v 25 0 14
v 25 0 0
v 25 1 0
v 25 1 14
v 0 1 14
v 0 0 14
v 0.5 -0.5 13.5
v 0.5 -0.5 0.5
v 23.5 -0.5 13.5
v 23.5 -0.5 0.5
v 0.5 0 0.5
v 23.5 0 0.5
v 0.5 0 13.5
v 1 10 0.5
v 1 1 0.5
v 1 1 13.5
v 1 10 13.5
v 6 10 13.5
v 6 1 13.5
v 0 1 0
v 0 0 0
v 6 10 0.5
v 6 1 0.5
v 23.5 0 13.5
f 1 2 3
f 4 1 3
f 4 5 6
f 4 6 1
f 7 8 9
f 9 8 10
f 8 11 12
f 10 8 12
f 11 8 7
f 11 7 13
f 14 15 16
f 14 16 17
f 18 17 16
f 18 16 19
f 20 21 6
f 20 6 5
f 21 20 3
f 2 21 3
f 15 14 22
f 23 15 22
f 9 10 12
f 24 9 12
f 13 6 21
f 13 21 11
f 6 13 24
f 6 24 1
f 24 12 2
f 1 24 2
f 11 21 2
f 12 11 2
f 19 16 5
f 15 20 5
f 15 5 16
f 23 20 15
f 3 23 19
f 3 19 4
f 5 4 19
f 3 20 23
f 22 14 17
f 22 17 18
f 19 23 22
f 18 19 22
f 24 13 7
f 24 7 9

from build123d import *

# Parameters (mm, degrees)
BOX002_W     = 5
BOX002_H     = 10
BOX002_DEPTH = 13
BOX001_W     = 23
BOX001_H     = 1
BOX001_DEPTH = 13
BOX_W        = 25
BOX_H        = 1
BOX_DEPTH    = 14


with BuildPart() as cubo002:
    # Box002 → Box002 (new body)
    with BuildSketch(Plane(origin=(1, 0, 0.5), x_dir=(1, 0, 0), z_dir=(0, 0, 1))):
        with Locations((2.5, 5)):
            Rectangle(BOX002_W, BOX002_H)
    extrude(amount=BOX002_DEPTH)


with BuildPart() as cubo001:
    # Box001 → Box001 (new body)
    with BuildSketch(Plane(origin=(0.5, -0.5, 0.5), x_dir=(1, 0, 0), z_dir=(0, 0, 1))):
        with Locations((11.5, 0.5)):
            Rectangle(BOX001_W, BOX001_H)
    extrude(amount=BOX001_DEPTH)


with BuildPart() as fusion:
    # Box → Box (new body)
    with BuildSketch(Plane.XY):
        with Locations((12.5, 0.5)):
            Rectangle(BOX_W, BOX_H)
    extrude(amount=BOX_DEPTH)

    # Fusion: union Cubo002, Cubo001
    add(cubo002.part)
    add(cubo001.part)


solid = fusion.part
